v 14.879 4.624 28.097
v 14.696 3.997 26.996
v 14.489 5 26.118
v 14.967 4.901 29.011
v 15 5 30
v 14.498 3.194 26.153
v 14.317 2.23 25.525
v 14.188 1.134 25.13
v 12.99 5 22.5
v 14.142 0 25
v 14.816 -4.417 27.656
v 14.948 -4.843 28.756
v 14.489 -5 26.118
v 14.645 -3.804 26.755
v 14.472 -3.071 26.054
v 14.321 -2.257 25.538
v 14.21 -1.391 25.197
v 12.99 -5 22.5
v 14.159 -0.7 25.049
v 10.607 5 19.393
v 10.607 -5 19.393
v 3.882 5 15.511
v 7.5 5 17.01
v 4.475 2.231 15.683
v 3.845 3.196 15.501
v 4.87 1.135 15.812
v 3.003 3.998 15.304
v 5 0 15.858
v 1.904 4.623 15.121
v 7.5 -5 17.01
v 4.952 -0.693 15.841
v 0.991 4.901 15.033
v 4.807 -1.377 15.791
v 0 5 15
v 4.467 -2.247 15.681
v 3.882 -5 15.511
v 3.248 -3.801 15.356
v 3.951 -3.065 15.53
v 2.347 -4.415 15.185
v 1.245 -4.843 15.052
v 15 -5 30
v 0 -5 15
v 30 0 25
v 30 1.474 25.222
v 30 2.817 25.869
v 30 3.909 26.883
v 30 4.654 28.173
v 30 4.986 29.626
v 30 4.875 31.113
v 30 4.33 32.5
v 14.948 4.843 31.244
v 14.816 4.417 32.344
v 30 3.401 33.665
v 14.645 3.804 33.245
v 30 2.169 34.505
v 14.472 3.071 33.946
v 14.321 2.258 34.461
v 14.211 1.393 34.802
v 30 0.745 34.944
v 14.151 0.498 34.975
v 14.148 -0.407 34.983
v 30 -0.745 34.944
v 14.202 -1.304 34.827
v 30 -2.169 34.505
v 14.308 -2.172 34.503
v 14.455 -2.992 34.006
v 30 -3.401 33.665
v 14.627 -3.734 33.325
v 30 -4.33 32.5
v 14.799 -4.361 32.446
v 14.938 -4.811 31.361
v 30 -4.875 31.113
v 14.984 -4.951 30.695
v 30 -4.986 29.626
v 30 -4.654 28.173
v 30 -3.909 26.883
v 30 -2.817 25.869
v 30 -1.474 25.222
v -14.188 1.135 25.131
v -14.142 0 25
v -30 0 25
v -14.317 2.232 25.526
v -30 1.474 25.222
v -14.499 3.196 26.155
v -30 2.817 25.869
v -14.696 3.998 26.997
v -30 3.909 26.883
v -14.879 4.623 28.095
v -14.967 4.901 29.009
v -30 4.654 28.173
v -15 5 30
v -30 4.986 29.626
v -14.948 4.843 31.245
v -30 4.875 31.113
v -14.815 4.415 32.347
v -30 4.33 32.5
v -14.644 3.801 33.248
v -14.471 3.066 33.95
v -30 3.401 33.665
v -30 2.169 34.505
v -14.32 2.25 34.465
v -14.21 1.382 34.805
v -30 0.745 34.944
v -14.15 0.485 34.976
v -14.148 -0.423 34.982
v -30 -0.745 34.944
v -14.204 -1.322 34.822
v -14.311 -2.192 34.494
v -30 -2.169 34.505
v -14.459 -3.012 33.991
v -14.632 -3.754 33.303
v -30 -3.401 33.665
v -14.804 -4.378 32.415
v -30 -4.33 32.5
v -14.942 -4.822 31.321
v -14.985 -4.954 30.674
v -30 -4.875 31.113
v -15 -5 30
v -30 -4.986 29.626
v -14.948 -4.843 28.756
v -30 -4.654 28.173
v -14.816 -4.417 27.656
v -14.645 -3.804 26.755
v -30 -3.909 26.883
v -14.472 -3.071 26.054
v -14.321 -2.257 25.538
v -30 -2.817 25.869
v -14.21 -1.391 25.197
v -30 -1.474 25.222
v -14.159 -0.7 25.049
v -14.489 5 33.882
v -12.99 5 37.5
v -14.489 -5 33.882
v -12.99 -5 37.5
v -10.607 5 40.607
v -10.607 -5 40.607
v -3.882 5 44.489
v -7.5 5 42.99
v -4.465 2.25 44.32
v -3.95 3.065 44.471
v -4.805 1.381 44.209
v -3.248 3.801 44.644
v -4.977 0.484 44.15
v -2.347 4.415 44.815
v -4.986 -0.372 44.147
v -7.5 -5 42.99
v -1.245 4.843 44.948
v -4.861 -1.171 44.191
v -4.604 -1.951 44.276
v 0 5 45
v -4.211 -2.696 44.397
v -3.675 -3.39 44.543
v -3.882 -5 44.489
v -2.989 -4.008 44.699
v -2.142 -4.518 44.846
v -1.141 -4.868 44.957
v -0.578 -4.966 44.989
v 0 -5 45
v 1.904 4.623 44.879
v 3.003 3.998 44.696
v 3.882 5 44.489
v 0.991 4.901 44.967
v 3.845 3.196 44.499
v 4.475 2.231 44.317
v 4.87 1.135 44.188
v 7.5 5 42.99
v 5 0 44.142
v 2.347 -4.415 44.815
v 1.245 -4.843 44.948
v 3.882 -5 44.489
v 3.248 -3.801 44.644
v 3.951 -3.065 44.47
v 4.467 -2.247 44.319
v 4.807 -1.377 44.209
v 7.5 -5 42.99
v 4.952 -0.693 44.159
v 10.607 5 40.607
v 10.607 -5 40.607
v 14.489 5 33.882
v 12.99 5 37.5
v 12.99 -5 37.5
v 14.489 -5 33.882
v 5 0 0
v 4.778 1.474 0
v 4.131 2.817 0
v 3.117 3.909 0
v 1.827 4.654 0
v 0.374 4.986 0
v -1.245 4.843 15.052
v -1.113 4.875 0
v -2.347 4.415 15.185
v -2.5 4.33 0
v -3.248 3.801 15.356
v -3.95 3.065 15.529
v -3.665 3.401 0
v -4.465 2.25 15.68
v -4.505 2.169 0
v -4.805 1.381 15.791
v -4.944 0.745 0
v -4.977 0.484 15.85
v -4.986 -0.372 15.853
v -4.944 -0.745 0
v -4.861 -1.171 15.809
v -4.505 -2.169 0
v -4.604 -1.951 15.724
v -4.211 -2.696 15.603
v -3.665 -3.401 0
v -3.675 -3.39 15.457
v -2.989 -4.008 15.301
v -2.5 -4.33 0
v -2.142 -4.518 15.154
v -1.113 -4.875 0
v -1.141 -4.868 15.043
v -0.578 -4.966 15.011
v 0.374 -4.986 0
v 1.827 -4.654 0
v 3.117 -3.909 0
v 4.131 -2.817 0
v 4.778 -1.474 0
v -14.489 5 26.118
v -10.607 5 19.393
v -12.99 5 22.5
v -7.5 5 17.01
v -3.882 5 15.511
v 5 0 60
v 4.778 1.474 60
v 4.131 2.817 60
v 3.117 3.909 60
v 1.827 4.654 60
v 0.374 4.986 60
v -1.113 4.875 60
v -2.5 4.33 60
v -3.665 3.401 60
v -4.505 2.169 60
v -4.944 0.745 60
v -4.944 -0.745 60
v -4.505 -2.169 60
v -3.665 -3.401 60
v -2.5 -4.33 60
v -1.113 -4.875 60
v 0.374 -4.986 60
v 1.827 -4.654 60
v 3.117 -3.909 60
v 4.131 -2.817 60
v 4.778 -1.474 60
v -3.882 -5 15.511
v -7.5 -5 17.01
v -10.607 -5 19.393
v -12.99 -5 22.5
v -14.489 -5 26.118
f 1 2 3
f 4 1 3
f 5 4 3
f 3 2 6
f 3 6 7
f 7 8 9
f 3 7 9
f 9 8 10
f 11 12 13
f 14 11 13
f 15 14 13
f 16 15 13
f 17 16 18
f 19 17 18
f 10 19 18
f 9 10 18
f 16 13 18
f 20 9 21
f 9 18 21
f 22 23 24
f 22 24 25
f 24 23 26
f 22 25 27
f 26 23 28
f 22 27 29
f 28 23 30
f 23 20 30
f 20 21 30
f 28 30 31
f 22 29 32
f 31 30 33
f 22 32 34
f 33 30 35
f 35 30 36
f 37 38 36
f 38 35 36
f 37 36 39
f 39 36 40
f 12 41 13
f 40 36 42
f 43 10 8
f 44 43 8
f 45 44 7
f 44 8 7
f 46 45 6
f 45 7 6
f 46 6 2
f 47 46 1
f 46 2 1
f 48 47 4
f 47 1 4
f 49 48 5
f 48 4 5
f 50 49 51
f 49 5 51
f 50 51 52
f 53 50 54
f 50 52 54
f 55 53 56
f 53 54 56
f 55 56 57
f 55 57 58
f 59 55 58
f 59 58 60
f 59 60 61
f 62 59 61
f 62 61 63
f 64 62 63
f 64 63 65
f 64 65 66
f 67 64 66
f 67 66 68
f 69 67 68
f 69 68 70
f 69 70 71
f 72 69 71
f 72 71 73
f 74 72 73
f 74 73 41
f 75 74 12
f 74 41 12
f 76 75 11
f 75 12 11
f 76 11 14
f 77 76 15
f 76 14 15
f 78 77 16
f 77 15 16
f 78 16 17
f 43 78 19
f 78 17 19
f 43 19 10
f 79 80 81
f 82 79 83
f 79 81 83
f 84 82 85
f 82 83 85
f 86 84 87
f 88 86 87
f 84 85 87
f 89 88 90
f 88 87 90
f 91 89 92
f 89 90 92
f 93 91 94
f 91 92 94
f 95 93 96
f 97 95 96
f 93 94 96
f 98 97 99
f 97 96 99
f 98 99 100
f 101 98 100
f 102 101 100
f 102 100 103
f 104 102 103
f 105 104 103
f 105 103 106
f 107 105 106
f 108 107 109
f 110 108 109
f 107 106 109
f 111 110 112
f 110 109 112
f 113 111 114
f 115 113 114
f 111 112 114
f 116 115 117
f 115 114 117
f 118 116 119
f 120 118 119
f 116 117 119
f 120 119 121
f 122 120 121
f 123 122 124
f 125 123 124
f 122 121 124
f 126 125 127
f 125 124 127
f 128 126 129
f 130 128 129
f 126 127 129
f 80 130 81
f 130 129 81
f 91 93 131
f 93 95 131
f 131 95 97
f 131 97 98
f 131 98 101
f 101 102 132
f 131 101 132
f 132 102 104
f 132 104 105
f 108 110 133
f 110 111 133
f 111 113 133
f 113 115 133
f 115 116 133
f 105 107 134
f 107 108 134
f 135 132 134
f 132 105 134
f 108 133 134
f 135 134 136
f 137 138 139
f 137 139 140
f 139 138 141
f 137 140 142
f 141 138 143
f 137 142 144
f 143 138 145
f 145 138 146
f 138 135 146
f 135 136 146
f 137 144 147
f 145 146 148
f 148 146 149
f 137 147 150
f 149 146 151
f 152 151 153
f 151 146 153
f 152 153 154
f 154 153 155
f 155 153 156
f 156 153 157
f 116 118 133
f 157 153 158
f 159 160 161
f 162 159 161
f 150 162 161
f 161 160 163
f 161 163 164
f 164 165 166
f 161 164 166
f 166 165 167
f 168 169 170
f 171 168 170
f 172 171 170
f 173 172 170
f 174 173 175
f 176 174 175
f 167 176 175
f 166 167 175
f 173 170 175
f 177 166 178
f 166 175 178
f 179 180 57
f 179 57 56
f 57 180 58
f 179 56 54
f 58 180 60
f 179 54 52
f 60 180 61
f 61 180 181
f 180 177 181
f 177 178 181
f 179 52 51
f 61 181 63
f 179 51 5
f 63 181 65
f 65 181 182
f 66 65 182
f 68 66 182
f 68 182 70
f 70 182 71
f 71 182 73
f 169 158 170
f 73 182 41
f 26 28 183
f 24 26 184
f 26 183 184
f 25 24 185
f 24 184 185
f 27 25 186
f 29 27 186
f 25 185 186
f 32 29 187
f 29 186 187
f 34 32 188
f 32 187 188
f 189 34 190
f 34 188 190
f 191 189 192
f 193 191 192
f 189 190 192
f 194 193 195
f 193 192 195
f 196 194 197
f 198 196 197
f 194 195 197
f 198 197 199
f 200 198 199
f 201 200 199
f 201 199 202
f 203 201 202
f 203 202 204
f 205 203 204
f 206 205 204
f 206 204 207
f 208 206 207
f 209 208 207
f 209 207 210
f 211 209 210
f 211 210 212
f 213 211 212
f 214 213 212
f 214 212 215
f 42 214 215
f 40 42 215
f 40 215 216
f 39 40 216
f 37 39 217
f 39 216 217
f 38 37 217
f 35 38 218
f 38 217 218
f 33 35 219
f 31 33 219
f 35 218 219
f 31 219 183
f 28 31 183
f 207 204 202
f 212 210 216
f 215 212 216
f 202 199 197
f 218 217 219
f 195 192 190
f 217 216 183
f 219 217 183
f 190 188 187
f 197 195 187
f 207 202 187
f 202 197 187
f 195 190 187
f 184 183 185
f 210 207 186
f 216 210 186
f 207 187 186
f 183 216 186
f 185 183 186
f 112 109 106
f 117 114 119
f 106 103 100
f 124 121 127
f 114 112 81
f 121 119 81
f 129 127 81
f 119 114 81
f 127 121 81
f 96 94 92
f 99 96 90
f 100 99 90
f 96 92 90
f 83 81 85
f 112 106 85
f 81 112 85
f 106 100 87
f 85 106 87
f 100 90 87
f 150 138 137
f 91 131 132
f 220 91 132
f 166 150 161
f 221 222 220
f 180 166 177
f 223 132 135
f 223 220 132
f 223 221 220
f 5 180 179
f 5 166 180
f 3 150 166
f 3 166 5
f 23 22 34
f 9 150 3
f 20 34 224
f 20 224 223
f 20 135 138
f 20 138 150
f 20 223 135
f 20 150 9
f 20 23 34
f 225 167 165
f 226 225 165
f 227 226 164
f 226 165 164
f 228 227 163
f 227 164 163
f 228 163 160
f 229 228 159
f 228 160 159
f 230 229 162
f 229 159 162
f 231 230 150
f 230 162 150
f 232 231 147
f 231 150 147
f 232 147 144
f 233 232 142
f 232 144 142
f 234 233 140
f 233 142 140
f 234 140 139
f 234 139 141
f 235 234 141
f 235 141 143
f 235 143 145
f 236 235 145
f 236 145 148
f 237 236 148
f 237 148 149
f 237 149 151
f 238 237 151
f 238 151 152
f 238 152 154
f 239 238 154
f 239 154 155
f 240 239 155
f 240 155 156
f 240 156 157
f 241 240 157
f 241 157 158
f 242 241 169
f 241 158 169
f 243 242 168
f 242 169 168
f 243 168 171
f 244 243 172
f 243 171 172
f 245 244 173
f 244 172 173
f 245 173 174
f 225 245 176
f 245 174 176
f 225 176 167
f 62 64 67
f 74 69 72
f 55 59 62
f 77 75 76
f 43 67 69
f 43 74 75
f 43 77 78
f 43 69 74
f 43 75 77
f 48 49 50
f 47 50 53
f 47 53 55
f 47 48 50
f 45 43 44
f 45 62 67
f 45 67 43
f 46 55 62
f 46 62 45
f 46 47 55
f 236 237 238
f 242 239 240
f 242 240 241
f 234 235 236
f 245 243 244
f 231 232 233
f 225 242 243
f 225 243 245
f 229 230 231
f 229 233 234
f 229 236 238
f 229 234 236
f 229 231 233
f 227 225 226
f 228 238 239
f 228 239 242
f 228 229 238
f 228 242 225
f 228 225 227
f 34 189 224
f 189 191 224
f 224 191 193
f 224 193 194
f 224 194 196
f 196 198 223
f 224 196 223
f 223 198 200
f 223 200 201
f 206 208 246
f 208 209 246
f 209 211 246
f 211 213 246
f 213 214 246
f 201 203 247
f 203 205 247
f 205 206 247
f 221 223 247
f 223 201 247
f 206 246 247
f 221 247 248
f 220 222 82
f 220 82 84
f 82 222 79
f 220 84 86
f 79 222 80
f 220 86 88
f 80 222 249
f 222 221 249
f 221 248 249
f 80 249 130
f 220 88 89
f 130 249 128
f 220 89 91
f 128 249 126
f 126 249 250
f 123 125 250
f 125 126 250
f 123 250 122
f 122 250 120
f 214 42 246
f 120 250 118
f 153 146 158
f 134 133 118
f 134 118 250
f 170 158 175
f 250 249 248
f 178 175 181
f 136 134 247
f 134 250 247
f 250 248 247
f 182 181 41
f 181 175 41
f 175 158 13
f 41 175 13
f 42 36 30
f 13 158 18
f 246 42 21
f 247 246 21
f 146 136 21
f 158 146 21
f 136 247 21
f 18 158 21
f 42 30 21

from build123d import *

# Parameters (mm, degrees)
NORTH_SOUTH_SKETCH_R              = 5
NORTH_SOUTH_EXTRUDE_DEPTH         = 60
EAST_WEST_EXTRUDE_DEPTH           = 30
EAST_WEST_EXTRUDE_DEPTH_BACK      = 30
EAST_WEST_SKETCH_R                = 5
CENTER_SUPPORT_EXTRUDE_DEPTH      = 5
CENTER_SUPPORT_EXTRUDE_DEPTH_BACK = 5
CENTER_SUPPORT_SKETCH_R           = 15


with BuildPart() as part:
    # North-South Sketch → North-South Extrude (new body)
    with BuildSketch(Plane.XY):
        Circle(NORTH_SOUTH_SKETCH_R)
    extrude(amount=NORTH_SOUTH_EXTRUDE_DEPTH)

    # East-West Sketch → East-West Extrude (add, two sides: drawn at the far end of the back side and taken through both)
    with BuildSketch(Plane(origin=(0, 0, 0), x_dir=(0, 0, -1), z_dir=(1, 0, 0)).offset(-EAST_WEST_EXTRUDE_DEPTH_BACK)):
        with Locations((-30, 0)):
            Circle(EAST_WEST_SKETCH_R)
    extrude(amount=EAST_WEST_EXTRUDE_DEPTH + EAST_WEST_EXTRUDE_DEPTH_BACK)

    # Center Support Sketch → Center Support Extrude (add, two sides: drawn at the far end of the back side and taken through both)
    with BuildSketch(Plane(origin=(0, 0, 0), x_dir=(1, 0, 0), z_dir=(0, 1, 0)).offset(-CENTER_SUPPORT_EXTRUDE_DEPTH_BACK)):
        with Locations((0, -30)):
            Circle(CENTER_SUPPORT_SKETCH_R)
    extrude(amount=CENTER_SUPPORT_EXTRUDE_DEPTH + CENTER_SUPPORT_EXTRUDE_DEPTH_BACK)


solid = part.part
